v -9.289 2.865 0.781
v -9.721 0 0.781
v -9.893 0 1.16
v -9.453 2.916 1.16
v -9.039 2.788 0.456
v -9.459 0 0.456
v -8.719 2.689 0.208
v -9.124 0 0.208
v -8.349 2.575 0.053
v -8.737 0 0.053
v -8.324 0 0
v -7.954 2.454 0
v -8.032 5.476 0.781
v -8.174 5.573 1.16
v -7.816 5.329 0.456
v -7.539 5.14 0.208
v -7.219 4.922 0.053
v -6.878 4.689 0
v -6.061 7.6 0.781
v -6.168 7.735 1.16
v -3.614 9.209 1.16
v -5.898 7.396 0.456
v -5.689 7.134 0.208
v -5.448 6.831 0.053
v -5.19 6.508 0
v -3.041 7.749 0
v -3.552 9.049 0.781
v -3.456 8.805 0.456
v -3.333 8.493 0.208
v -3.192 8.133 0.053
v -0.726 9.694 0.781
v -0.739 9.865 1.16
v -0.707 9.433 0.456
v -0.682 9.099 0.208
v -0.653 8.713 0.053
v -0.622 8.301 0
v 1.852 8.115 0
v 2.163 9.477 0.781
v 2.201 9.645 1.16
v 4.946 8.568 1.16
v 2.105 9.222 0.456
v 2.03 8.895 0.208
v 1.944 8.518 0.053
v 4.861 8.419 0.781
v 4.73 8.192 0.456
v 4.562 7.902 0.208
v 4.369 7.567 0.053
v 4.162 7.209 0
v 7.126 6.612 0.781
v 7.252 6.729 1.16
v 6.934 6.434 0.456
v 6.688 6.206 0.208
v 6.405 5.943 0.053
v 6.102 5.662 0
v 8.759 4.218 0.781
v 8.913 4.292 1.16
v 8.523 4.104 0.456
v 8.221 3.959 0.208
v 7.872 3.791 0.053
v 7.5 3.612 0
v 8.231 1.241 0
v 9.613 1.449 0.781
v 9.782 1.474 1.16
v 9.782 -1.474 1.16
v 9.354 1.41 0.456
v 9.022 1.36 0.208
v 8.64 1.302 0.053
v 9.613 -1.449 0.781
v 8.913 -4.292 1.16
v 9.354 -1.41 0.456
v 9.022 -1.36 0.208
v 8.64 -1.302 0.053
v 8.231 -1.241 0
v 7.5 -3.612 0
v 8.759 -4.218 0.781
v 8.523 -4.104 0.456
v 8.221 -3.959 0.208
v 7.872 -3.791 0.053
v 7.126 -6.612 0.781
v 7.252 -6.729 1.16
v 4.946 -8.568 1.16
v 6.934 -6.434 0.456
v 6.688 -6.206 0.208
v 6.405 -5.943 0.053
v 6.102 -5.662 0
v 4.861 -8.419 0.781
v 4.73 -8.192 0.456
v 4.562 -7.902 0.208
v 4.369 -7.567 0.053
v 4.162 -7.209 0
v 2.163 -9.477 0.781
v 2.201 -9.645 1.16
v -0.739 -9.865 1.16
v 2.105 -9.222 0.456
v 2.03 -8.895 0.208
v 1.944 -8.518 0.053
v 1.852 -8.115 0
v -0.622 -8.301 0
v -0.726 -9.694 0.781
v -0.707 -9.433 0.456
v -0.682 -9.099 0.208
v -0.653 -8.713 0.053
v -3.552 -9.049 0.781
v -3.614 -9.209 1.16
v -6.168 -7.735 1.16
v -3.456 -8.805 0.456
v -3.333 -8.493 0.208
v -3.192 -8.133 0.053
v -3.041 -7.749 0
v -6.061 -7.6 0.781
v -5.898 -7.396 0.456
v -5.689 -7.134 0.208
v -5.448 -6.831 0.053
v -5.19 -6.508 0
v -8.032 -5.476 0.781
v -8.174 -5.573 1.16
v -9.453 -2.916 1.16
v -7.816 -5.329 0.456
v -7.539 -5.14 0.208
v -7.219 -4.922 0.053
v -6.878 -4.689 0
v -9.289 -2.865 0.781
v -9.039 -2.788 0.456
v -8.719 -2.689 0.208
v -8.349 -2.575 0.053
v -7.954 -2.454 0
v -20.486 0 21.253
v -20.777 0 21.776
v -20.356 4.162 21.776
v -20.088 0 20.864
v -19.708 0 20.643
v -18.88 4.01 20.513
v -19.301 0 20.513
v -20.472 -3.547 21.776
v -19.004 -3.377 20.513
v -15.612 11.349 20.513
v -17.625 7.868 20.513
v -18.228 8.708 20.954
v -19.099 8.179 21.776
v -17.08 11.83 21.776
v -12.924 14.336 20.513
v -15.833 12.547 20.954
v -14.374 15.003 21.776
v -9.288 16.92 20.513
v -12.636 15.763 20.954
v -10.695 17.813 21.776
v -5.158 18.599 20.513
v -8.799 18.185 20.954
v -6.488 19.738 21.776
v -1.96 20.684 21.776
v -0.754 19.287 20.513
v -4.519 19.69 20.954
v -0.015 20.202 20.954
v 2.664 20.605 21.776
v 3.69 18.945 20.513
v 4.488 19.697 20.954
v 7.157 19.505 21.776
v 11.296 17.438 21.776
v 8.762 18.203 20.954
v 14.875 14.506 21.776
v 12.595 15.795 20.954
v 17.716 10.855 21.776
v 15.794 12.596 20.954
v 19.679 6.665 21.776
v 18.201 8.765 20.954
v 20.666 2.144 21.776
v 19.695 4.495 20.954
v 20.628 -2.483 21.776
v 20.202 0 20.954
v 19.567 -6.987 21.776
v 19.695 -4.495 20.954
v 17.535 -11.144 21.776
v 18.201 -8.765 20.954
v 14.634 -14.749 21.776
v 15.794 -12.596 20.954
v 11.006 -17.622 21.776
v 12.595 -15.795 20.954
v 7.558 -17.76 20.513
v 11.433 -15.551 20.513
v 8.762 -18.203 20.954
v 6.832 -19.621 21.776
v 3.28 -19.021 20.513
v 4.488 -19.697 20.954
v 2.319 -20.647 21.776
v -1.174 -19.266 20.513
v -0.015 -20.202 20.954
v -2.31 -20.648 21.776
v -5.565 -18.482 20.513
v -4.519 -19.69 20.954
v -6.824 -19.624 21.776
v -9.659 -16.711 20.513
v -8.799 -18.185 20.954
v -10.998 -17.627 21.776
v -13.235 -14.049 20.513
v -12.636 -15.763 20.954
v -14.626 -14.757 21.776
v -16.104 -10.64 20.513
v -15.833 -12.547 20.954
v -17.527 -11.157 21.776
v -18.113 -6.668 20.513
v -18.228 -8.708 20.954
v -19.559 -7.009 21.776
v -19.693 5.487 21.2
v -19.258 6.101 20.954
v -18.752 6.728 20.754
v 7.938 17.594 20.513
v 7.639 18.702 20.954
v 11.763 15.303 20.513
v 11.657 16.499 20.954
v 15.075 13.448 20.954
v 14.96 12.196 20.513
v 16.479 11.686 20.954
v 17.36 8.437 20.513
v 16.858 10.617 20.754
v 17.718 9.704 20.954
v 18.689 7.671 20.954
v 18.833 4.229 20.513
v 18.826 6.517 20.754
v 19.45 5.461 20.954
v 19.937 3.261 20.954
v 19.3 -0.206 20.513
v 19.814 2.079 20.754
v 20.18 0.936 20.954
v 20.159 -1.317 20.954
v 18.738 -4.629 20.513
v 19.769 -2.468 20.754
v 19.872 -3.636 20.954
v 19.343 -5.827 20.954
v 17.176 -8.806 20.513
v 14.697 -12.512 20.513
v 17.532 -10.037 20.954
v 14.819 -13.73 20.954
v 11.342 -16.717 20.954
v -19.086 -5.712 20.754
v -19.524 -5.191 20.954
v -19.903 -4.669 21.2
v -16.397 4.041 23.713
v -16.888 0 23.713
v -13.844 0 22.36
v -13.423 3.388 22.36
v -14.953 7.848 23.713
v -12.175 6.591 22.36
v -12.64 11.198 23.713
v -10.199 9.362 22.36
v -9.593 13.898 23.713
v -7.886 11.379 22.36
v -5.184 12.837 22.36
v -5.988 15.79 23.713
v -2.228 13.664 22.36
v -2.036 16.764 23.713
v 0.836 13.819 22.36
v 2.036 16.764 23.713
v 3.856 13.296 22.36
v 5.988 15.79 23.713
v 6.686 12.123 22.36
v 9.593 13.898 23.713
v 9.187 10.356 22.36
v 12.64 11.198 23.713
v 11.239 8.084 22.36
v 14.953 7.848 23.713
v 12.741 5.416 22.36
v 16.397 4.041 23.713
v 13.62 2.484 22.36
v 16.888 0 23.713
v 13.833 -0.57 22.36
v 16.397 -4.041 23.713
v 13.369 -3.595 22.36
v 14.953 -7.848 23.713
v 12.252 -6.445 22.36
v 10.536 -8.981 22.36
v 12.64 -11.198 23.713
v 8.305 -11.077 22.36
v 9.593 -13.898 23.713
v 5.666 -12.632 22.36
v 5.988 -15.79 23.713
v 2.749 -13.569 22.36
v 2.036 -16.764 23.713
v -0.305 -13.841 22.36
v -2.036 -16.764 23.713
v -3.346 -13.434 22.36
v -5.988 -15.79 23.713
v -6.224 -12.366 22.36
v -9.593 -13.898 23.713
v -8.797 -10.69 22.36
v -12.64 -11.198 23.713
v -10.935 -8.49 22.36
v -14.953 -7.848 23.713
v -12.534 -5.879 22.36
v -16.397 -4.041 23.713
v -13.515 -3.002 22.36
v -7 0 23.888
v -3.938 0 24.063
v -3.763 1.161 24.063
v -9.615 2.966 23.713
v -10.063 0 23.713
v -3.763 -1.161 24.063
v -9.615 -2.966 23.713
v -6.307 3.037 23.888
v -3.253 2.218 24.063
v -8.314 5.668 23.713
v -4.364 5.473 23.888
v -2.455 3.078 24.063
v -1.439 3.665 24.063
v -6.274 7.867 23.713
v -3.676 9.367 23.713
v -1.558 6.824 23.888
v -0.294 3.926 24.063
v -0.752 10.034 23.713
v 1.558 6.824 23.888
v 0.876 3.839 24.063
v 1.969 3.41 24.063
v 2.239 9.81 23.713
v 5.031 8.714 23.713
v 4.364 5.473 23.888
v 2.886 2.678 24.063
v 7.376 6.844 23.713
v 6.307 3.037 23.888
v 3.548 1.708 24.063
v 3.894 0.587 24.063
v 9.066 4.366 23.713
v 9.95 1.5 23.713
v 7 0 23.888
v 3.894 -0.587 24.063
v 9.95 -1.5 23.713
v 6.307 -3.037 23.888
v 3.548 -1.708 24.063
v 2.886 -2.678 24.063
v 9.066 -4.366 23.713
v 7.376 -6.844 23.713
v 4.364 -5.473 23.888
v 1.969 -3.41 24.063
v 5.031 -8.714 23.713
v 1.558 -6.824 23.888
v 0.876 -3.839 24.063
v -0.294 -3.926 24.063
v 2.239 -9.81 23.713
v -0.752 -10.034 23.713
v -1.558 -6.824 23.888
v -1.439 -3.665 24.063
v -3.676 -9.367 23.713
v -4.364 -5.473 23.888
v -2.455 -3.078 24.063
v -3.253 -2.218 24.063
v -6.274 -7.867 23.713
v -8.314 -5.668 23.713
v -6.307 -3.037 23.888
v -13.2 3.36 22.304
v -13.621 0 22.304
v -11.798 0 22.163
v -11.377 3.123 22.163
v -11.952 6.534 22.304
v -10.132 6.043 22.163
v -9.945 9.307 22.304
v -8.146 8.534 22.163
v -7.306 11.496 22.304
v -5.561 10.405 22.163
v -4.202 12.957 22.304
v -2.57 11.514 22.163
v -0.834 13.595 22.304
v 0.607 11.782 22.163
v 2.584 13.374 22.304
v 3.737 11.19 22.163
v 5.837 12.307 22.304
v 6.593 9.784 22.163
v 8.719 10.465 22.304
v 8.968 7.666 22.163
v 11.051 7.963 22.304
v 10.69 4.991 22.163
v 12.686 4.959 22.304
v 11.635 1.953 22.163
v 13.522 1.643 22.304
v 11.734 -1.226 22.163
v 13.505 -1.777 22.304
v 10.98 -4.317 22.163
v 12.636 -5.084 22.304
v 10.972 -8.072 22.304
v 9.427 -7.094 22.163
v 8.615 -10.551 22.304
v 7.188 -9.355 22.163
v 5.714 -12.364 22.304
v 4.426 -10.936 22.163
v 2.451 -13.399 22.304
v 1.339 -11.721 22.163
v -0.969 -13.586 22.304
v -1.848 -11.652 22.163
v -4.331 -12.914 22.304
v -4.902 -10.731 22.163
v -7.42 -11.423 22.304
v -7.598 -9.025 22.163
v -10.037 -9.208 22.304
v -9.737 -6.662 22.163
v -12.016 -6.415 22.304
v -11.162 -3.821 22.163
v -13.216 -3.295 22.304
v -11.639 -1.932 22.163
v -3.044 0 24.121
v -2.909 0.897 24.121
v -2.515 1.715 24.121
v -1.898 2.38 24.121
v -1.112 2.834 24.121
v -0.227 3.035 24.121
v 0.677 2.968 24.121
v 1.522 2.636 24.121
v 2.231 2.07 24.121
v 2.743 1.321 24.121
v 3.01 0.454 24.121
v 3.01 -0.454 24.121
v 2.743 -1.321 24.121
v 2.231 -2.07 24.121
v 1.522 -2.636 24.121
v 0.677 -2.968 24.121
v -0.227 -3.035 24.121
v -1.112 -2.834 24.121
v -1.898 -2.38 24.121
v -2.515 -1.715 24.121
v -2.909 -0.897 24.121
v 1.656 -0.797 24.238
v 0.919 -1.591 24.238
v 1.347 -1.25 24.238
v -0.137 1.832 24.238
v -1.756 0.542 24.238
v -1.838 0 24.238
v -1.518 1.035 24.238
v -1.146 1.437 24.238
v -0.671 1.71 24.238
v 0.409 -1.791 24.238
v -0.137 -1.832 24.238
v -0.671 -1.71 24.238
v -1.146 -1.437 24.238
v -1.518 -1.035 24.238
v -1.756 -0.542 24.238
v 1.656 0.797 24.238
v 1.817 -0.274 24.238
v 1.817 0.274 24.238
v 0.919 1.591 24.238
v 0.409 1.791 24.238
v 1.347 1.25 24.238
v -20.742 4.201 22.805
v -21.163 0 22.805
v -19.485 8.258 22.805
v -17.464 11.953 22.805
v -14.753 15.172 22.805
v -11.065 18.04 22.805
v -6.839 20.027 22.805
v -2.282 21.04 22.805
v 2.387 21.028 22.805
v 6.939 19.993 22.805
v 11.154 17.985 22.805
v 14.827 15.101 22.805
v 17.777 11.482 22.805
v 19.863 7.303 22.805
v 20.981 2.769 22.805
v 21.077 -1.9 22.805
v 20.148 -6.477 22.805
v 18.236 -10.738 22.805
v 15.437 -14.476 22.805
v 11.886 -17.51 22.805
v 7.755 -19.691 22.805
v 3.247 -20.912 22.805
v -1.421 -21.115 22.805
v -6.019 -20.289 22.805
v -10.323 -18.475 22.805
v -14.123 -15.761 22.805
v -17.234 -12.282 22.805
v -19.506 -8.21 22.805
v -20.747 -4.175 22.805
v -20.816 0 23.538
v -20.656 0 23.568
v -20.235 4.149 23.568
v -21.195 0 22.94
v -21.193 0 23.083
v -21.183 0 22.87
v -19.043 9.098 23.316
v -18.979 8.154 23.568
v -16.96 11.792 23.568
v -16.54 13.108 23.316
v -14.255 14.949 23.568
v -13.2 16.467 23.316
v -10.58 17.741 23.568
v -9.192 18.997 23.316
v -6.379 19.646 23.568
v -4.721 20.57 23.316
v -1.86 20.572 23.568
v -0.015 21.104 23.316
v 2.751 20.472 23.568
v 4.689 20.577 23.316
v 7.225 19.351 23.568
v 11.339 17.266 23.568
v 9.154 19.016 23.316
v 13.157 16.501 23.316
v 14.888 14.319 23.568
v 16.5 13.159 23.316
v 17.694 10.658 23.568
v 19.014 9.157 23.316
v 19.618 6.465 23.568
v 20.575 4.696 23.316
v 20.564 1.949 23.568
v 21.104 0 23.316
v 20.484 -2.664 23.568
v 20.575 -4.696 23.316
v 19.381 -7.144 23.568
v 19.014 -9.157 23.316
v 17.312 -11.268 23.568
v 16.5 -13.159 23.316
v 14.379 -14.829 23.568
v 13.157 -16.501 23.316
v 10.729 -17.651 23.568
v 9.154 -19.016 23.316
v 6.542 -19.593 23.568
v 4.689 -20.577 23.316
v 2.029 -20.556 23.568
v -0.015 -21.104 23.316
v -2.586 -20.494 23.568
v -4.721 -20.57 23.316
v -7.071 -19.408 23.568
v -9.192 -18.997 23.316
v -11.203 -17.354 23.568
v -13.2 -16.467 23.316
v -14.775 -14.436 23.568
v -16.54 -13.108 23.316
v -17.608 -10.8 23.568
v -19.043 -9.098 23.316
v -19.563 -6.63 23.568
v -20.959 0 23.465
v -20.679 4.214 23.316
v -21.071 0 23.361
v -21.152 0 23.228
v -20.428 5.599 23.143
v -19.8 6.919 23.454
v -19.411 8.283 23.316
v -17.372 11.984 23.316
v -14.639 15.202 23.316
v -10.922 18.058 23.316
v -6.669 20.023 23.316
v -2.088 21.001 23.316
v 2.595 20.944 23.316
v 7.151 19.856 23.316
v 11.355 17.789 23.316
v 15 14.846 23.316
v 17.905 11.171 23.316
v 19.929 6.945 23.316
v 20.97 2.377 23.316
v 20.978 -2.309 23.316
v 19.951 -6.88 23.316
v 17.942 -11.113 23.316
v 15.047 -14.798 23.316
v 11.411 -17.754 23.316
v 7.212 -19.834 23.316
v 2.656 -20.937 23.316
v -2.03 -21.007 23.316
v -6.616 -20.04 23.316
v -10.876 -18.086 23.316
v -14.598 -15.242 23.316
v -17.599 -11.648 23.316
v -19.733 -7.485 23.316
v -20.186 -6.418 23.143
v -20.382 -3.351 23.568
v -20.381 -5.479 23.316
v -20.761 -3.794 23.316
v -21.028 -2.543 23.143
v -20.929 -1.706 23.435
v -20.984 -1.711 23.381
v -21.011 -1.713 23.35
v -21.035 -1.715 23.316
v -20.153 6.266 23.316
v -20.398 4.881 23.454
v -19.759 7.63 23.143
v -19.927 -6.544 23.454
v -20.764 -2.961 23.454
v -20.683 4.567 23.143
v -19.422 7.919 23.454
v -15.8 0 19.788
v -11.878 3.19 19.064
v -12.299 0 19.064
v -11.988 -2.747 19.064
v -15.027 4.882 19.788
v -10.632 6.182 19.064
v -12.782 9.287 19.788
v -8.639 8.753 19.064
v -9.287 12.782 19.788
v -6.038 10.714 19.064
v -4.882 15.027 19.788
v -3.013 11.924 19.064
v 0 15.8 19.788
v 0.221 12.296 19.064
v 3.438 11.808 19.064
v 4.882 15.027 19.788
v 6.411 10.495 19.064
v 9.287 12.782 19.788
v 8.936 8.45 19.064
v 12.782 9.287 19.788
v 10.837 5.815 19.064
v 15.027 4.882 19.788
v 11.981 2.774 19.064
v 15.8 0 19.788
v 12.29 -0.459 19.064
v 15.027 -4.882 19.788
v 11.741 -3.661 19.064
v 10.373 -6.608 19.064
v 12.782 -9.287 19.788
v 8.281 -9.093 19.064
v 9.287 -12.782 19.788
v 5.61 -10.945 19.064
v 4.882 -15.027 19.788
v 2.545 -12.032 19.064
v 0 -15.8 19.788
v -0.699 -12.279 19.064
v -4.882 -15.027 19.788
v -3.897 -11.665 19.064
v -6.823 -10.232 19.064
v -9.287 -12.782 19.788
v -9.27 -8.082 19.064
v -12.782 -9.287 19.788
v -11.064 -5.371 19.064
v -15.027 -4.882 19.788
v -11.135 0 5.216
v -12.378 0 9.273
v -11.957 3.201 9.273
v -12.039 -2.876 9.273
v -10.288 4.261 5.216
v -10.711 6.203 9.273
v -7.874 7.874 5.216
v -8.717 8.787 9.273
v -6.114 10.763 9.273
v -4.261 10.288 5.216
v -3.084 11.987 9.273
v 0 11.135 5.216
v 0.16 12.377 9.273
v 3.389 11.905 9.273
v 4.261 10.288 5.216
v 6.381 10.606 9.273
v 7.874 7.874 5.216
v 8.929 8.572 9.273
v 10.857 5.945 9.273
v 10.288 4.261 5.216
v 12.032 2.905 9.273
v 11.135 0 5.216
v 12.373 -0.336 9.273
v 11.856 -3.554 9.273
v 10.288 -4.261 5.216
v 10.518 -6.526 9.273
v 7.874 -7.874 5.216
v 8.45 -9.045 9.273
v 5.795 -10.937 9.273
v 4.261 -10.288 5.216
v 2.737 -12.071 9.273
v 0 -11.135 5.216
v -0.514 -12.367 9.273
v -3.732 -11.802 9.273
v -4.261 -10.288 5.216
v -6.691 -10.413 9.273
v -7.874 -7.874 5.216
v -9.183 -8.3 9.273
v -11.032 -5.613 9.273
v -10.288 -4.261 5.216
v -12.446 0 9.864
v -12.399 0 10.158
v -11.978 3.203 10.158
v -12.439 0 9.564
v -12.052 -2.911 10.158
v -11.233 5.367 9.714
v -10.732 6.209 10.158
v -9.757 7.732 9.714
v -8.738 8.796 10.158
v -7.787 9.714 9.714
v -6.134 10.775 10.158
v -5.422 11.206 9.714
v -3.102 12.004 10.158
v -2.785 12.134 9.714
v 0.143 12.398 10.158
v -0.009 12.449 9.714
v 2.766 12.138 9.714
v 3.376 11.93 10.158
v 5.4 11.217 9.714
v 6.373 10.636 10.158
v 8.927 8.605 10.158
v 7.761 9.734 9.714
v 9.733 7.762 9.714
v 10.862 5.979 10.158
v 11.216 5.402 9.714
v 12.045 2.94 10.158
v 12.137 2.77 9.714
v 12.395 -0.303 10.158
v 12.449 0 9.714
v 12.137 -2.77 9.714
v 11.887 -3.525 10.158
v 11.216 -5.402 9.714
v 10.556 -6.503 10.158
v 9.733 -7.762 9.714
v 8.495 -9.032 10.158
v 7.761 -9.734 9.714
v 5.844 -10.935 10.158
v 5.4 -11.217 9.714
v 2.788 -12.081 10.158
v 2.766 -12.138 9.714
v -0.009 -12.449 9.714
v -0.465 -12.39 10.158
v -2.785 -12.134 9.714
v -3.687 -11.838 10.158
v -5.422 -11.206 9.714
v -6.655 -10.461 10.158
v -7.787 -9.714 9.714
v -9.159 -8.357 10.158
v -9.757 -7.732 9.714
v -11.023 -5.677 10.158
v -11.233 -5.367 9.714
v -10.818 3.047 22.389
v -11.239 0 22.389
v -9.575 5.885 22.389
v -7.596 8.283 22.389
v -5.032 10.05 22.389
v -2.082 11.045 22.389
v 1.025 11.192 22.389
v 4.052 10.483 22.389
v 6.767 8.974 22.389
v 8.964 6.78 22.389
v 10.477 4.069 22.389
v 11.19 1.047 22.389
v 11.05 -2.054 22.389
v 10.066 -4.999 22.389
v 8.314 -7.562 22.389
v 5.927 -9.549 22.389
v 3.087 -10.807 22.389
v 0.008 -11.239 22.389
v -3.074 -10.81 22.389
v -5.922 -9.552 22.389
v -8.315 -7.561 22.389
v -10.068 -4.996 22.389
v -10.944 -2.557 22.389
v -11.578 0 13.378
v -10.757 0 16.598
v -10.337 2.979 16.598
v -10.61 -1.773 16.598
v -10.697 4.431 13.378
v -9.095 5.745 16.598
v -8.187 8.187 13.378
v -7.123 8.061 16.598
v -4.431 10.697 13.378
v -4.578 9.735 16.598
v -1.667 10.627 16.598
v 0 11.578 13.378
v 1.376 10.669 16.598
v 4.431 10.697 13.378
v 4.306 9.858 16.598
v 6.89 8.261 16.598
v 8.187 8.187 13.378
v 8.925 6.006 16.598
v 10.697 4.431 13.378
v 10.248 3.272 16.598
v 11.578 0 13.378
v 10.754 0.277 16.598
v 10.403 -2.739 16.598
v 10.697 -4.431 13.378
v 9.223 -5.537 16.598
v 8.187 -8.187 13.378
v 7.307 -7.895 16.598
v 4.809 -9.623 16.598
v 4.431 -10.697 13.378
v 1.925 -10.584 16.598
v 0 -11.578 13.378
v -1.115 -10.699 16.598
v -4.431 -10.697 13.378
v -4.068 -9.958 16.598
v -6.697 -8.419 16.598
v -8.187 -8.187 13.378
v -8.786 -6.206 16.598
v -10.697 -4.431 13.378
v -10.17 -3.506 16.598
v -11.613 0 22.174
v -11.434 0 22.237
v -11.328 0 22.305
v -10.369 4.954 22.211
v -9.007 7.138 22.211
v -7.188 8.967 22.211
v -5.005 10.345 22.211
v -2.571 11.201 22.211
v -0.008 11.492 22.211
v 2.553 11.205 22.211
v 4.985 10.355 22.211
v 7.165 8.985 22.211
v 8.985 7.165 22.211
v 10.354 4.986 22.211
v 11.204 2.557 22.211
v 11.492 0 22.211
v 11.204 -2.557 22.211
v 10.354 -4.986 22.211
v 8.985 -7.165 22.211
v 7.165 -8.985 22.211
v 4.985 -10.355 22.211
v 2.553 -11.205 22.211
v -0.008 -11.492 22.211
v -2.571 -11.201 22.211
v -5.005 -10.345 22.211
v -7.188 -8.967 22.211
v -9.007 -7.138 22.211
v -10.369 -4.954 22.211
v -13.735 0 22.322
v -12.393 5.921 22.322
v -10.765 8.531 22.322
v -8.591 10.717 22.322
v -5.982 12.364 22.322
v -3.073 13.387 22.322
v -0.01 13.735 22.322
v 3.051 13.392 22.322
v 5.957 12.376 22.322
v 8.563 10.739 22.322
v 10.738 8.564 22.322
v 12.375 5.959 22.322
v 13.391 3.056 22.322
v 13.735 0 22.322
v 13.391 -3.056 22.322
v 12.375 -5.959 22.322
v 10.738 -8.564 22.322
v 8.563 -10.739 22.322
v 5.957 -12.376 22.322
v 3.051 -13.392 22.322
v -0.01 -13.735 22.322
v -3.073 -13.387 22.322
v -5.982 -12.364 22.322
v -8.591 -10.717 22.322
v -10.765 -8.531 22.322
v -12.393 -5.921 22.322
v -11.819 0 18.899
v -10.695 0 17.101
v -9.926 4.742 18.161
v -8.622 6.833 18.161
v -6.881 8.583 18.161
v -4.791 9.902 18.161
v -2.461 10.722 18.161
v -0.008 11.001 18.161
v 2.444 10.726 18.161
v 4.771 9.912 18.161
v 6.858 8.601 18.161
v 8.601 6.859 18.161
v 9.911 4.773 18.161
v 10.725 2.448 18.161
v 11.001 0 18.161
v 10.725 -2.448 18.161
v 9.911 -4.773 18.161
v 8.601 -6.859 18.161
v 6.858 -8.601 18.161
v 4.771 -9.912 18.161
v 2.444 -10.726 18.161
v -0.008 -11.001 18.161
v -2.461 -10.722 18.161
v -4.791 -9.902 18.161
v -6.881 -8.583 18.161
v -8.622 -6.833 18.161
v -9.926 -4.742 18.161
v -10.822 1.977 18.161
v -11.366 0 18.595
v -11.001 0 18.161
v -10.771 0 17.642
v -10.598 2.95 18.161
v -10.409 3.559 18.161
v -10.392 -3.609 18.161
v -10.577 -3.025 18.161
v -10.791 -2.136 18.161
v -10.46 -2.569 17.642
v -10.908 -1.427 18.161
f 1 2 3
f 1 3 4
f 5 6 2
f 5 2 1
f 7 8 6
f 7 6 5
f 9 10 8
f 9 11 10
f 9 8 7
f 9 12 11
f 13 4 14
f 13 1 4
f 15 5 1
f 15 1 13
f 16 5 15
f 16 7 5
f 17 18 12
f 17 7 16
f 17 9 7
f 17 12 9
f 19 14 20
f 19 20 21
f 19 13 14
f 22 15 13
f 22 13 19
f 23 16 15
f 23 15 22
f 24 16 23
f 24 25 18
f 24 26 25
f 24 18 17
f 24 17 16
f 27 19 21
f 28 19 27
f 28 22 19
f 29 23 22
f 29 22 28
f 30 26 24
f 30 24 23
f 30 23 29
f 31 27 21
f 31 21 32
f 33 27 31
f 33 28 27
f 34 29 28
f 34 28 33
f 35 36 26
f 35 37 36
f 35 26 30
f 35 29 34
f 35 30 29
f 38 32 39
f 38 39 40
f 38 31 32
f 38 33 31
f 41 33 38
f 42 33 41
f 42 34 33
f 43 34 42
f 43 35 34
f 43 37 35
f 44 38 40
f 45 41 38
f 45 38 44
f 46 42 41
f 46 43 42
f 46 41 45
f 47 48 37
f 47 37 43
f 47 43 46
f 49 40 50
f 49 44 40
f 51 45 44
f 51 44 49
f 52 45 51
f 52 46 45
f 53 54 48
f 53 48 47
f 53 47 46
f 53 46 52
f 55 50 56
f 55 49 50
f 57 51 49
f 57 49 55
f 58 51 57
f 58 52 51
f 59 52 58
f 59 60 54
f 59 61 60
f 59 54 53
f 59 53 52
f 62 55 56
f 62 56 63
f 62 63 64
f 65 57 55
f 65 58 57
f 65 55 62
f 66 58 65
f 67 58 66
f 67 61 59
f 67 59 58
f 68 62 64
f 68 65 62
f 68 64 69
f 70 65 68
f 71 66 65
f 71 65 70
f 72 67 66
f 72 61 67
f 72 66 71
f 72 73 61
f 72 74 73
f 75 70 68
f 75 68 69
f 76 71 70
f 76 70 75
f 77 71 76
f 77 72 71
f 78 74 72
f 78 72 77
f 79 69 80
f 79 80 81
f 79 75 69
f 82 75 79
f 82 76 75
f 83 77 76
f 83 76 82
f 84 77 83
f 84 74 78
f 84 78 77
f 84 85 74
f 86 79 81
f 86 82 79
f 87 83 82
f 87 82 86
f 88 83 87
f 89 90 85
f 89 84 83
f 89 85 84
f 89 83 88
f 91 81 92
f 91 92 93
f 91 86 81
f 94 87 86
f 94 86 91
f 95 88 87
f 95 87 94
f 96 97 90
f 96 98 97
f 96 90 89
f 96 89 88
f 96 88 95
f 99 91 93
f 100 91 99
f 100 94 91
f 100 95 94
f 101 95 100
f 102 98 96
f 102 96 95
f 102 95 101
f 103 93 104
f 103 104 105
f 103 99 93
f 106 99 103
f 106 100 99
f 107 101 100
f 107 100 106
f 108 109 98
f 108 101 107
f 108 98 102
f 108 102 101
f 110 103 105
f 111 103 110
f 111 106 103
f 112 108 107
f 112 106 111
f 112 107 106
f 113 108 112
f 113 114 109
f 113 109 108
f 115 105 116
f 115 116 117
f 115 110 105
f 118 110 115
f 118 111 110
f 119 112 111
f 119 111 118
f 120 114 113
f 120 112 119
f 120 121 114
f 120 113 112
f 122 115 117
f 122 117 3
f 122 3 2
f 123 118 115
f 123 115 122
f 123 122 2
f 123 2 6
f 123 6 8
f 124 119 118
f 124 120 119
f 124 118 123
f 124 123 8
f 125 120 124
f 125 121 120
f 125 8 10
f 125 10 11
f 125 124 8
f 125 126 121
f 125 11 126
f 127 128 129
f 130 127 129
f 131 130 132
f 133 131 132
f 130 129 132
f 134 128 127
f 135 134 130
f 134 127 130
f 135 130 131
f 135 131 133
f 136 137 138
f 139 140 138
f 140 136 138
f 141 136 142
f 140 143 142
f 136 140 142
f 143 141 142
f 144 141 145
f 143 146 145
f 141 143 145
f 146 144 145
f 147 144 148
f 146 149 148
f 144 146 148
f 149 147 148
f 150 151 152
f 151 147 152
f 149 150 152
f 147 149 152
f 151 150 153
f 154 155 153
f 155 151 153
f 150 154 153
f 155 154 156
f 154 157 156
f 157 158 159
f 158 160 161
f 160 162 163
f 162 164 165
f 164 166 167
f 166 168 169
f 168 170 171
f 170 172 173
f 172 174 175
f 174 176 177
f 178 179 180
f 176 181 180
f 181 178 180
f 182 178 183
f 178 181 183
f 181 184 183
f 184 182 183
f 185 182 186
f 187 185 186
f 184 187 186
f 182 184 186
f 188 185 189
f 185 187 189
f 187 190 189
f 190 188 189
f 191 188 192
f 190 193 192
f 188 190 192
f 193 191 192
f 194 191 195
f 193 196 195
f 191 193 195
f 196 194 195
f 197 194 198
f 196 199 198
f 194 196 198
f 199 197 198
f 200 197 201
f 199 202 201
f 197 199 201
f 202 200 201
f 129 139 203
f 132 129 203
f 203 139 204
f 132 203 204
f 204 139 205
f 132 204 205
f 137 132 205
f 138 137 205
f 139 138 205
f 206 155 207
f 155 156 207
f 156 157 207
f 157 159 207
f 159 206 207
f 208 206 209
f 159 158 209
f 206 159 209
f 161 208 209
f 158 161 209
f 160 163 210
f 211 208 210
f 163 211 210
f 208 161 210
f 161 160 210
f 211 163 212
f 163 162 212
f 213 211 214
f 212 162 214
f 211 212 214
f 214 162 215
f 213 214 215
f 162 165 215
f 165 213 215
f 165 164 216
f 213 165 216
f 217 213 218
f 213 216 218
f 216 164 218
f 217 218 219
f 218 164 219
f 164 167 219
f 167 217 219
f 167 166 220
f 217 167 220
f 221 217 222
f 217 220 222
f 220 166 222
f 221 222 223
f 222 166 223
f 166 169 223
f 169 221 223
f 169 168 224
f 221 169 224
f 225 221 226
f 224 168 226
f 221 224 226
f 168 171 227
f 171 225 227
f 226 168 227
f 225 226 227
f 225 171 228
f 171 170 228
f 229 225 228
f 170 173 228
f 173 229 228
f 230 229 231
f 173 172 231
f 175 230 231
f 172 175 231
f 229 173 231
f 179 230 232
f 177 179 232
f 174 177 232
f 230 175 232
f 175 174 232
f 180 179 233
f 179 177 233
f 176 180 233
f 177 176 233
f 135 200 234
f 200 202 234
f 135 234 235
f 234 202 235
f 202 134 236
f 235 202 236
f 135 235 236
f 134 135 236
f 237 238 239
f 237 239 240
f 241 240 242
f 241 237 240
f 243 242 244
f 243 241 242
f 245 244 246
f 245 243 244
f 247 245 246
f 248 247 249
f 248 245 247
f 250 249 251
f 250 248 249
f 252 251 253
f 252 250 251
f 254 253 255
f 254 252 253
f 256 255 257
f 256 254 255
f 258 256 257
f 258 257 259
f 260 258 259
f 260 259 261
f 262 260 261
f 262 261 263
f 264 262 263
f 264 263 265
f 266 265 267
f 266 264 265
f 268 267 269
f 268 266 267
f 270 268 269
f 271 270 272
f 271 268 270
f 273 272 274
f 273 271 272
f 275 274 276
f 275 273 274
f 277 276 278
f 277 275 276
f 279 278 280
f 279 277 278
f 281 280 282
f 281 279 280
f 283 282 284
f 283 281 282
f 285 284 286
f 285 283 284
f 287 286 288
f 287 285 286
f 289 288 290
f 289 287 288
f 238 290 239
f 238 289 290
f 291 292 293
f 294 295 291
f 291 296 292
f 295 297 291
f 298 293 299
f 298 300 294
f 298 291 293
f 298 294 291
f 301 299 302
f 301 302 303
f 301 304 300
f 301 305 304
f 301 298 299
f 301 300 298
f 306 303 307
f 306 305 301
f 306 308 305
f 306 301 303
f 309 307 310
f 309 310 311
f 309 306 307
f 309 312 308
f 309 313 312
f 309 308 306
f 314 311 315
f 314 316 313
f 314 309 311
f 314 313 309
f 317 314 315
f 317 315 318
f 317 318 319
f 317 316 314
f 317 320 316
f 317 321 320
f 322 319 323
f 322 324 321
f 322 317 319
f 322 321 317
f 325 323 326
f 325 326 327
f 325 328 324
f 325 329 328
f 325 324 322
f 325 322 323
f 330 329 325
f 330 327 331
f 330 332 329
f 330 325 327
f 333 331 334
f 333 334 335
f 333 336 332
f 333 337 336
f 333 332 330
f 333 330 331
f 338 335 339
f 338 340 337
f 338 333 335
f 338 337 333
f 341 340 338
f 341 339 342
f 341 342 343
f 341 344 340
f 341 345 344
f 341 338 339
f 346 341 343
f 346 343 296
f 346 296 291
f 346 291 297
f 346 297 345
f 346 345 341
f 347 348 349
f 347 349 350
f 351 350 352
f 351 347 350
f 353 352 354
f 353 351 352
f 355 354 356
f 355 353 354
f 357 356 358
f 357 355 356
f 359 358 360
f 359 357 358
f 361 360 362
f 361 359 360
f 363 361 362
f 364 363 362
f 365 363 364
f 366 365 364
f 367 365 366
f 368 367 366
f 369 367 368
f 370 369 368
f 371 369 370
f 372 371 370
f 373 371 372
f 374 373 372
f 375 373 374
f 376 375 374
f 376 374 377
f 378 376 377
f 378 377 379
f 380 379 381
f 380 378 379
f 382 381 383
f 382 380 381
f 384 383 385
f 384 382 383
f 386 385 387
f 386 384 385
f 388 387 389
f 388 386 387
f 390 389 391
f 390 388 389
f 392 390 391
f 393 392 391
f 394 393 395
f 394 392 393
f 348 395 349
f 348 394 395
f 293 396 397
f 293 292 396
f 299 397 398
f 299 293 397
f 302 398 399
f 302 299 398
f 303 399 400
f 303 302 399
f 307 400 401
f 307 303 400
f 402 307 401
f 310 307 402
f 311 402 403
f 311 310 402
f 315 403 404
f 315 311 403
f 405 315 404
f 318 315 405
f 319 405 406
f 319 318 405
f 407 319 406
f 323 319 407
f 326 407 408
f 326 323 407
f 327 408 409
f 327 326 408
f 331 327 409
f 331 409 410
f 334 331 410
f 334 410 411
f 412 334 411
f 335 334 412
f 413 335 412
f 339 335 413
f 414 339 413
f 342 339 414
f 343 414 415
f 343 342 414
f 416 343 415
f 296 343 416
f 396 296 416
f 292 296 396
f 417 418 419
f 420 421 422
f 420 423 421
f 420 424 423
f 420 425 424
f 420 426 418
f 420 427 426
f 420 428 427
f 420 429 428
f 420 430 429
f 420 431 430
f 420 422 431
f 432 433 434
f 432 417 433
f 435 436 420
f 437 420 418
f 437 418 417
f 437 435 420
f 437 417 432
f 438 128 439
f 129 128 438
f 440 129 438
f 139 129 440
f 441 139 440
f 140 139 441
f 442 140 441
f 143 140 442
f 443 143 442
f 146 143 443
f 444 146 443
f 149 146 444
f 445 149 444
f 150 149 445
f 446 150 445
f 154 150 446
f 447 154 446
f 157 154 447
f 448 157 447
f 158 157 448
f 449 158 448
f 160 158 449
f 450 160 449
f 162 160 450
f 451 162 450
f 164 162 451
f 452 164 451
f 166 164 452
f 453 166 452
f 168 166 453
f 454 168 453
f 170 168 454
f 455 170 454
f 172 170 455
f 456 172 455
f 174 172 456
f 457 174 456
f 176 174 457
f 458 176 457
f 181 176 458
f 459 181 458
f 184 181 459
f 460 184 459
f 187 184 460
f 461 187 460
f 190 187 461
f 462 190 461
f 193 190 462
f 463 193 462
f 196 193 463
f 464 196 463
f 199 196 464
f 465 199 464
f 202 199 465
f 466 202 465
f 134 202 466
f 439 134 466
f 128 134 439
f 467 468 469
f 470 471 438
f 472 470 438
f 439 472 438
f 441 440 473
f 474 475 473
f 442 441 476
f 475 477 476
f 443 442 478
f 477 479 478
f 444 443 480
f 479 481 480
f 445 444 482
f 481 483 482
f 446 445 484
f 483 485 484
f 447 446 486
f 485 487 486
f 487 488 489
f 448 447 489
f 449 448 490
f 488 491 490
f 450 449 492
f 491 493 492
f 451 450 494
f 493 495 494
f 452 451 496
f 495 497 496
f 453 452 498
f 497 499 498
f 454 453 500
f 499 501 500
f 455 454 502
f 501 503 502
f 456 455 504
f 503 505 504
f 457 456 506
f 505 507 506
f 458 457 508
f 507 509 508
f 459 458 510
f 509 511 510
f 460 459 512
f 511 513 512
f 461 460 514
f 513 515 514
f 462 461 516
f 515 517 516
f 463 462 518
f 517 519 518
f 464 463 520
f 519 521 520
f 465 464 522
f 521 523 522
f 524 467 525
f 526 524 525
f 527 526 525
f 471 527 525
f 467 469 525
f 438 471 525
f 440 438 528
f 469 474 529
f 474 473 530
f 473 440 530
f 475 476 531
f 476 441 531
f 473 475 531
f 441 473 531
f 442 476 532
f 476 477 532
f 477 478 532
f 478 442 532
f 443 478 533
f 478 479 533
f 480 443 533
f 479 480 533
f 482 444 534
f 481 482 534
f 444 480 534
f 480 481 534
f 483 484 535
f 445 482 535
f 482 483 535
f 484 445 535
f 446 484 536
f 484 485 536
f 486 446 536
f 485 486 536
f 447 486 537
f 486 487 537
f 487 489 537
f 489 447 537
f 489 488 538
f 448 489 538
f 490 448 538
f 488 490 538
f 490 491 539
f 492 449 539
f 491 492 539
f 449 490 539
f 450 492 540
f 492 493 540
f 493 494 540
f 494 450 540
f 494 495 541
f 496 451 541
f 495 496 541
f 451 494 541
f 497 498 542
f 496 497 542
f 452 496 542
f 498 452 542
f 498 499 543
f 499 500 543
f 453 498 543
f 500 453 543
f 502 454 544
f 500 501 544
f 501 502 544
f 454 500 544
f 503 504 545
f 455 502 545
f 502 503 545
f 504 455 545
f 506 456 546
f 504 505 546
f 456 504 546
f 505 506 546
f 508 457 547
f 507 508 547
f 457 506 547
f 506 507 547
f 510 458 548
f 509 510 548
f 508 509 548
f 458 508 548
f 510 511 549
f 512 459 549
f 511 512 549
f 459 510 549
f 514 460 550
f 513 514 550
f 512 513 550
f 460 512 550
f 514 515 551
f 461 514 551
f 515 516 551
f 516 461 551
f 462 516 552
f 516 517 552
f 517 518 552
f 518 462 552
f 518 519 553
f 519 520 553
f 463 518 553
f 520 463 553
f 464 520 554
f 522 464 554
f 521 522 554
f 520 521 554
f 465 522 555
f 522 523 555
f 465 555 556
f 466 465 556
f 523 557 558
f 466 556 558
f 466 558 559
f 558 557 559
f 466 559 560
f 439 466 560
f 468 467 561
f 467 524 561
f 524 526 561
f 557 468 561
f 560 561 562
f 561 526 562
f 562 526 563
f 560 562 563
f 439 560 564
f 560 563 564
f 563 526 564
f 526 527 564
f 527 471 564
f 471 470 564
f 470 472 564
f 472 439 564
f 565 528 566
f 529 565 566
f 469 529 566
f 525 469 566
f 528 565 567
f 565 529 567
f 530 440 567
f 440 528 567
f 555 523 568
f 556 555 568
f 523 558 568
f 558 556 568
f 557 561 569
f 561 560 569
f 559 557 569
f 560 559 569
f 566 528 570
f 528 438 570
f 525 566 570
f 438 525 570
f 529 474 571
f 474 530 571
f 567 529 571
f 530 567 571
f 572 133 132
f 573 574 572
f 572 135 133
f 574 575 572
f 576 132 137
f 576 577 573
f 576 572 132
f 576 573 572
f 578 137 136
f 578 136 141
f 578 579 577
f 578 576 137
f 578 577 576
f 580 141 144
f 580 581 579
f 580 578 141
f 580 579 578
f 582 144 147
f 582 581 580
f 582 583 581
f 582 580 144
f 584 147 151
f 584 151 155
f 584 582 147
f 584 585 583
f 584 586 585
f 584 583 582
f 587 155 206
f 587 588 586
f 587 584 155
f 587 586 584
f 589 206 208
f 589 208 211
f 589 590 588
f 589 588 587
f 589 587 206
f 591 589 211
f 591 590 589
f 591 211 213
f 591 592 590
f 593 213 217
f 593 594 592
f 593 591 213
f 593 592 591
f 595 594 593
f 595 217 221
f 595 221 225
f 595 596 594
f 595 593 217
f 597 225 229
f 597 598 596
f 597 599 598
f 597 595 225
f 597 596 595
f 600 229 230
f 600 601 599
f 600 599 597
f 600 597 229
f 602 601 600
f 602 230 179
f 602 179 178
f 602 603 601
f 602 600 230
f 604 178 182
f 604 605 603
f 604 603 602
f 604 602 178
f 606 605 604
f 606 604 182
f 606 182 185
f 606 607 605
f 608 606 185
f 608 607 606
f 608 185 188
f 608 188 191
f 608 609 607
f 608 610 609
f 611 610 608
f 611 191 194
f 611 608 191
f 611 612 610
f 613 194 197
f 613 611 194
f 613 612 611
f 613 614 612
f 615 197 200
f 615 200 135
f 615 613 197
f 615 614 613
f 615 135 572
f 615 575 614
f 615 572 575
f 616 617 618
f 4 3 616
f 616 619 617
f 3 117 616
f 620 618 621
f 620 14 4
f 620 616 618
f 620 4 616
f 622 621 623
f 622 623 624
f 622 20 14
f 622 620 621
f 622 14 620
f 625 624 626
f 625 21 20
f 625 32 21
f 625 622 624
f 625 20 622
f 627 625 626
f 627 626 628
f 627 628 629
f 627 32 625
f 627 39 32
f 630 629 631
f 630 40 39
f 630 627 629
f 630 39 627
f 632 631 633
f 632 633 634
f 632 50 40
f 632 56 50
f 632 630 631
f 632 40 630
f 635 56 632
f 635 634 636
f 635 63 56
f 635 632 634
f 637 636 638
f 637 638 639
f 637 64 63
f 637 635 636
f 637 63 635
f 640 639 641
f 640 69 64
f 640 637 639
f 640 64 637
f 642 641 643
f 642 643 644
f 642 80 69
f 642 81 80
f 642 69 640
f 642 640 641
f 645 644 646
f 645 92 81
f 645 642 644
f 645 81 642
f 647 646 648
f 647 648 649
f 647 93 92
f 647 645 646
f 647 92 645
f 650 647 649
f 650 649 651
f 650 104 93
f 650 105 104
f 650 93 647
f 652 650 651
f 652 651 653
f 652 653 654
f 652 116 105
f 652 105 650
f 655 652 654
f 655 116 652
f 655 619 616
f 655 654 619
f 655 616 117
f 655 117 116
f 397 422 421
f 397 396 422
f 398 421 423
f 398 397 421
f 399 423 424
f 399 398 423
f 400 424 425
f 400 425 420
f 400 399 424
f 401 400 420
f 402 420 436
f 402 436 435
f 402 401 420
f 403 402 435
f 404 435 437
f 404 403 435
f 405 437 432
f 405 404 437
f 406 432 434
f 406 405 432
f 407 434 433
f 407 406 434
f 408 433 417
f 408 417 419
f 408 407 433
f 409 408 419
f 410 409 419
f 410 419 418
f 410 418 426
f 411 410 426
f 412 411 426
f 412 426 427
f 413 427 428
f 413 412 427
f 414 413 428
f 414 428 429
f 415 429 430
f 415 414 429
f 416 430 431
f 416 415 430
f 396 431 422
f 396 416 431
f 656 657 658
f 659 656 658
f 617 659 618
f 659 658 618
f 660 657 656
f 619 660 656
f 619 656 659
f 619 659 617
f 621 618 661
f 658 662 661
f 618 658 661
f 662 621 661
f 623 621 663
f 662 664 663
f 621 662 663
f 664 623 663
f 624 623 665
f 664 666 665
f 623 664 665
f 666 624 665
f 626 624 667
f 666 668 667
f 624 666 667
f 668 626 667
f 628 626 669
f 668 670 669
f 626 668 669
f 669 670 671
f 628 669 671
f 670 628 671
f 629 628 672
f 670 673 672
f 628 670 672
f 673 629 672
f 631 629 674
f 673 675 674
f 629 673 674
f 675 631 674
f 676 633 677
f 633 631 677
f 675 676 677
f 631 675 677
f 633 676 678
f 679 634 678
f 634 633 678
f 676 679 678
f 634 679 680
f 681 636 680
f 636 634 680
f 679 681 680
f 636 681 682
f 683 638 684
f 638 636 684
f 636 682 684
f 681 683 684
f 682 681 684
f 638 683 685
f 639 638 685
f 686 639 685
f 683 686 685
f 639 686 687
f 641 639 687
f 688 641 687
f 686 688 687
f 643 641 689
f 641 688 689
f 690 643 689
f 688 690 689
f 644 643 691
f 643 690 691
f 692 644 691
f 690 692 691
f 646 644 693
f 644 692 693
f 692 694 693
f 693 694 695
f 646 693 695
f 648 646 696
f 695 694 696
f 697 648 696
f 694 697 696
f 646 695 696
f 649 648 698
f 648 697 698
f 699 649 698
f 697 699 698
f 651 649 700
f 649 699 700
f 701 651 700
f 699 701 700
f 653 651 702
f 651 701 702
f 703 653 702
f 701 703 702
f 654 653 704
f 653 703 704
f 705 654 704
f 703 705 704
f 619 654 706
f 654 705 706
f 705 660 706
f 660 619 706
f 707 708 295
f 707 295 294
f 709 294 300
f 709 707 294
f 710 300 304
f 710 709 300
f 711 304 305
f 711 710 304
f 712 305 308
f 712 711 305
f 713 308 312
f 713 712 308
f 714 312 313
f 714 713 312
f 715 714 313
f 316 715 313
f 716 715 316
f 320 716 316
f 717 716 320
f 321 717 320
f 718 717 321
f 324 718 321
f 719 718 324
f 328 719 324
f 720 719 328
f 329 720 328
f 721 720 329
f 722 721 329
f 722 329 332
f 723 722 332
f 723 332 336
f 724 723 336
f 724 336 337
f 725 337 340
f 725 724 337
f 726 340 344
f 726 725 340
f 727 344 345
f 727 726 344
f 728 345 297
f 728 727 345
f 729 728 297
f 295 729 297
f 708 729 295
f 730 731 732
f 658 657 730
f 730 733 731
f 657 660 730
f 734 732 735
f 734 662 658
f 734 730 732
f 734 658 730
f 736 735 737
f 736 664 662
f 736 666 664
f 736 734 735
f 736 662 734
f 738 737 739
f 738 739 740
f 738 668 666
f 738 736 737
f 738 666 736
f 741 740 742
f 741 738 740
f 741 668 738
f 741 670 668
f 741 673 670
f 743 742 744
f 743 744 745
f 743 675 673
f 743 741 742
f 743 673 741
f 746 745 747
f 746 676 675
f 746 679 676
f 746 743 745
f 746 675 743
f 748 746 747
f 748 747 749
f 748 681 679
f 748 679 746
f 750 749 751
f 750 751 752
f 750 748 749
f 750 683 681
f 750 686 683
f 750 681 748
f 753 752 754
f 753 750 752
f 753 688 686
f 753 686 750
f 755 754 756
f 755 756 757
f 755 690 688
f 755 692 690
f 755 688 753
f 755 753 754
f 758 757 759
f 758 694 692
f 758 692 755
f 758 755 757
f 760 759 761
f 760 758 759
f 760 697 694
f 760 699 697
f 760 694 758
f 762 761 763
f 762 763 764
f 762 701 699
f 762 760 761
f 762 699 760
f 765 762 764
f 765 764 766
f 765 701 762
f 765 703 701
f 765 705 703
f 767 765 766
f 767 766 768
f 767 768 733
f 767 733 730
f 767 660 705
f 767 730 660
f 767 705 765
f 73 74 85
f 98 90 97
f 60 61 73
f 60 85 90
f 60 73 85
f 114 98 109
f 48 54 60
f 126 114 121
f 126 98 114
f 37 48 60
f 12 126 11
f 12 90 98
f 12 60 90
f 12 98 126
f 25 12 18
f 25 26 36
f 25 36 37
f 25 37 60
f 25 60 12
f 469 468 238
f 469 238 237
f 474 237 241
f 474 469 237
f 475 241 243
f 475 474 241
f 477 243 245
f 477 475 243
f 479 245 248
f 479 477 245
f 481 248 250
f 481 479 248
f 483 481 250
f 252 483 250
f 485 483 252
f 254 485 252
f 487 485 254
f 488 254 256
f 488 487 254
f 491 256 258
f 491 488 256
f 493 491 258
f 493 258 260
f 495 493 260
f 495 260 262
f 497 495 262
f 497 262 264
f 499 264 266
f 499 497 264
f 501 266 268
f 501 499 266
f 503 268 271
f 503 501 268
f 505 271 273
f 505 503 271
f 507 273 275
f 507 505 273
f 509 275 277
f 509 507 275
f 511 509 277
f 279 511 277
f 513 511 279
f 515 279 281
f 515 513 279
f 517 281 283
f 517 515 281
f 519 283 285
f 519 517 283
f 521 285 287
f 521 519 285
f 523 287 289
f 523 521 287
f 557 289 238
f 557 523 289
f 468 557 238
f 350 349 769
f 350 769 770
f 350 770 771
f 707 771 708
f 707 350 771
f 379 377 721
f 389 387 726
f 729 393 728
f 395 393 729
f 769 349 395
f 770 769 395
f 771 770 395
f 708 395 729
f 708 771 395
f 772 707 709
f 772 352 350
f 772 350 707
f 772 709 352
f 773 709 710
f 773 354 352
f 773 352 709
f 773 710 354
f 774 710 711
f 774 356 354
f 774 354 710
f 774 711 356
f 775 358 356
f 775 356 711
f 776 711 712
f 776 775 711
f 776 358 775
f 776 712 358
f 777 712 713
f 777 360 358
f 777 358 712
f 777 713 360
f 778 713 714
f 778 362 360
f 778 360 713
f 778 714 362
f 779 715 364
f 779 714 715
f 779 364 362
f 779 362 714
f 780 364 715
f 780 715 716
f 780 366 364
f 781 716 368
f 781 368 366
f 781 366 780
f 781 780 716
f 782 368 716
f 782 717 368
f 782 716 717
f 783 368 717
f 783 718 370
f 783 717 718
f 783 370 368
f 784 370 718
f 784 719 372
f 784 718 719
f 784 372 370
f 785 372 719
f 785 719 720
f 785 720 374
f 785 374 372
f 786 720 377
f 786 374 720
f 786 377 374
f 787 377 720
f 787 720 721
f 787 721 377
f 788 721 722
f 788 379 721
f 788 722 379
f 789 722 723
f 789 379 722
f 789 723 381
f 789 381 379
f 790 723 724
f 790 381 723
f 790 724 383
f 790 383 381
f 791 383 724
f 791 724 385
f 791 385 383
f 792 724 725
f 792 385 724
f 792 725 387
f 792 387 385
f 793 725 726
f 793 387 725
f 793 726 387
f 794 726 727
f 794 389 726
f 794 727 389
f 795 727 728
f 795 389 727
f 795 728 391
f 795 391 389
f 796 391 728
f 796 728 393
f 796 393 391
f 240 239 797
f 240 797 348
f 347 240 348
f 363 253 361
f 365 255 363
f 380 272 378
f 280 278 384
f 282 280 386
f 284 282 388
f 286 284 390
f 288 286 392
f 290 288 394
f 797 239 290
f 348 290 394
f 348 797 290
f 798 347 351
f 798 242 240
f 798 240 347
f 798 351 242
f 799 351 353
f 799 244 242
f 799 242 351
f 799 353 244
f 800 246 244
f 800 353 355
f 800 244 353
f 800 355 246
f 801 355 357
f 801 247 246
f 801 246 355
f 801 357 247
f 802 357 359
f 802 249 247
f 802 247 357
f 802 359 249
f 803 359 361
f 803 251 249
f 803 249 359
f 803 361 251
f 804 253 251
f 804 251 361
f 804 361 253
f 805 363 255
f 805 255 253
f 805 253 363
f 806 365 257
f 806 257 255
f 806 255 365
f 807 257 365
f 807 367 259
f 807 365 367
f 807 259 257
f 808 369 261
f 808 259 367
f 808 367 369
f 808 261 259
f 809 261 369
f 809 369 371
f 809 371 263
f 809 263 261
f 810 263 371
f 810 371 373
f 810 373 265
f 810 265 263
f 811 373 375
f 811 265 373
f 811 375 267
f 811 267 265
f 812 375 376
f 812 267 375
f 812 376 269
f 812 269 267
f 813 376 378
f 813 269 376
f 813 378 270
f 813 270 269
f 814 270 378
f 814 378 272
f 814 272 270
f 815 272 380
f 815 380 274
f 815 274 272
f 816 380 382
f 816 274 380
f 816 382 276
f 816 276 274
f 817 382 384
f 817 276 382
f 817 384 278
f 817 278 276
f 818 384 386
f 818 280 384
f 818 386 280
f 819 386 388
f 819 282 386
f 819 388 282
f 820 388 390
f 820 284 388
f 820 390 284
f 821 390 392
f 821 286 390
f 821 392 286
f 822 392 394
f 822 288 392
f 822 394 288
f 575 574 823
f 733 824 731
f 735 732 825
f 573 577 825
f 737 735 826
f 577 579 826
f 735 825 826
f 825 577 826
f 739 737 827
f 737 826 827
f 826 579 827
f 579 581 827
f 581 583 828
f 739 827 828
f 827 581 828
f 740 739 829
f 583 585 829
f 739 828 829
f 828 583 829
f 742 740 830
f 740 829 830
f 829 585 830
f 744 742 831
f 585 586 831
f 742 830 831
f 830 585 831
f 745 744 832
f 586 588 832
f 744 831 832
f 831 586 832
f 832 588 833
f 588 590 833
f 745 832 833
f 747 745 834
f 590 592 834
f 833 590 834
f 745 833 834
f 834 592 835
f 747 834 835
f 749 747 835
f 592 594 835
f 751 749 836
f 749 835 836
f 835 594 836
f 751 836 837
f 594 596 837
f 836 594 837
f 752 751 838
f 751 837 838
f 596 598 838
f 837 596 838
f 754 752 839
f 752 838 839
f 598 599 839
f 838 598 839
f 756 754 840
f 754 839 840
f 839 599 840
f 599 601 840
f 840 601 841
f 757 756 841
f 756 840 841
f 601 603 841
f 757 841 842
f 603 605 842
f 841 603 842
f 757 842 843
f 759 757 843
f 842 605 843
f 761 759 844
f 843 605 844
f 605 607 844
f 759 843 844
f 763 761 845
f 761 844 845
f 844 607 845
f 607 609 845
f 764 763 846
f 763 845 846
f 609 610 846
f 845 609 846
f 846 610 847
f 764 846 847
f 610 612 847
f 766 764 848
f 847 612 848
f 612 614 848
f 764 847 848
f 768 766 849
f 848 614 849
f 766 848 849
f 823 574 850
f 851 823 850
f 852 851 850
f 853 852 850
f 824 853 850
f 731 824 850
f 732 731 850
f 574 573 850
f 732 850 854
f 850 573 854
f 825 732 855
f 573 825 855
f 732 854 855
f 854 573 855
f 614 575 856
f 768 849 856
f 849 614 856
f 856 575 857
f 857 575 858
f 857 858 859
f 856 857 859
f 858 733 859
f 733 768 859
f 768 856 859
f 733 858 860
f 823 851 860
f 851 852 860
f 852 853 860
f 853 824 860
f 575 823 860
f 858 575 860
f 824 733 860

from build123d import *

# Parameters (mm, degrees)
F2_R = 0.564523
F3_R = 2.010865
F4_R = 0.677835
F5_R = 1.640956


with BuildPart() as f1:
    # F0 (on Front) → F1 (revolve)
    with BuildSketch(Plane.XZ):
        Polygon((-9.5375, 0), (0, 0), (0, 24.237502), (-1.8375, 24.237502), (-3.043977, 24.120657), (-3.937501, 24.062501), (-10.062501, 23.712501), (-11.4625, 22.137502), (-13.737501, 22.312501), (-16.887501, 23.712501), (-21.437502, 23.537502), (-20.387501, 20.737499), (-10.2375, 18.637501), (-12.5125, 9.7125), align=None)
    revolve(axis=Axis((0, 0, 12.118751), (0, 0, -1)))

    # F2
    f2_edges = [f1.edges().sort_by_distance(p)[0] for p in [
        (21.437502, 0, 23.537502),
    ]]
    fillet(f2_edges, radius=F2_R)

    # F3
    f3_edges = [f1.edges().sort_by_distance(p)[0] for p in [
        (20.387501, 0, 20.737499),
        (10.2375, 0, 18.637501),
        (-15.3125, 0, 19.6875),
    ]]
    fillet(f3_edges, radius=F3_R)

    # F4
    f4_edges = [f1.edges().sort_by_distance(p)[0] for p in [
        (11.4625, 0, 22.137502),
        (13.737501, 0, 22.312501),
        (-12.6, 0, 22.225002),
    ]]
    fillet(f4_edges, radius=F4_R)

    # F5
    f5_edges = [f1.edges().sort_by_distance(p)[0] for p in [
        (12.5125, 0, 9.7125),
        (9.5375, 0, 0),
        (-11.025, 0, 4.85625),
    ]]
    fillet(f5_edges, radius=F5_R)


solid = f1.part
